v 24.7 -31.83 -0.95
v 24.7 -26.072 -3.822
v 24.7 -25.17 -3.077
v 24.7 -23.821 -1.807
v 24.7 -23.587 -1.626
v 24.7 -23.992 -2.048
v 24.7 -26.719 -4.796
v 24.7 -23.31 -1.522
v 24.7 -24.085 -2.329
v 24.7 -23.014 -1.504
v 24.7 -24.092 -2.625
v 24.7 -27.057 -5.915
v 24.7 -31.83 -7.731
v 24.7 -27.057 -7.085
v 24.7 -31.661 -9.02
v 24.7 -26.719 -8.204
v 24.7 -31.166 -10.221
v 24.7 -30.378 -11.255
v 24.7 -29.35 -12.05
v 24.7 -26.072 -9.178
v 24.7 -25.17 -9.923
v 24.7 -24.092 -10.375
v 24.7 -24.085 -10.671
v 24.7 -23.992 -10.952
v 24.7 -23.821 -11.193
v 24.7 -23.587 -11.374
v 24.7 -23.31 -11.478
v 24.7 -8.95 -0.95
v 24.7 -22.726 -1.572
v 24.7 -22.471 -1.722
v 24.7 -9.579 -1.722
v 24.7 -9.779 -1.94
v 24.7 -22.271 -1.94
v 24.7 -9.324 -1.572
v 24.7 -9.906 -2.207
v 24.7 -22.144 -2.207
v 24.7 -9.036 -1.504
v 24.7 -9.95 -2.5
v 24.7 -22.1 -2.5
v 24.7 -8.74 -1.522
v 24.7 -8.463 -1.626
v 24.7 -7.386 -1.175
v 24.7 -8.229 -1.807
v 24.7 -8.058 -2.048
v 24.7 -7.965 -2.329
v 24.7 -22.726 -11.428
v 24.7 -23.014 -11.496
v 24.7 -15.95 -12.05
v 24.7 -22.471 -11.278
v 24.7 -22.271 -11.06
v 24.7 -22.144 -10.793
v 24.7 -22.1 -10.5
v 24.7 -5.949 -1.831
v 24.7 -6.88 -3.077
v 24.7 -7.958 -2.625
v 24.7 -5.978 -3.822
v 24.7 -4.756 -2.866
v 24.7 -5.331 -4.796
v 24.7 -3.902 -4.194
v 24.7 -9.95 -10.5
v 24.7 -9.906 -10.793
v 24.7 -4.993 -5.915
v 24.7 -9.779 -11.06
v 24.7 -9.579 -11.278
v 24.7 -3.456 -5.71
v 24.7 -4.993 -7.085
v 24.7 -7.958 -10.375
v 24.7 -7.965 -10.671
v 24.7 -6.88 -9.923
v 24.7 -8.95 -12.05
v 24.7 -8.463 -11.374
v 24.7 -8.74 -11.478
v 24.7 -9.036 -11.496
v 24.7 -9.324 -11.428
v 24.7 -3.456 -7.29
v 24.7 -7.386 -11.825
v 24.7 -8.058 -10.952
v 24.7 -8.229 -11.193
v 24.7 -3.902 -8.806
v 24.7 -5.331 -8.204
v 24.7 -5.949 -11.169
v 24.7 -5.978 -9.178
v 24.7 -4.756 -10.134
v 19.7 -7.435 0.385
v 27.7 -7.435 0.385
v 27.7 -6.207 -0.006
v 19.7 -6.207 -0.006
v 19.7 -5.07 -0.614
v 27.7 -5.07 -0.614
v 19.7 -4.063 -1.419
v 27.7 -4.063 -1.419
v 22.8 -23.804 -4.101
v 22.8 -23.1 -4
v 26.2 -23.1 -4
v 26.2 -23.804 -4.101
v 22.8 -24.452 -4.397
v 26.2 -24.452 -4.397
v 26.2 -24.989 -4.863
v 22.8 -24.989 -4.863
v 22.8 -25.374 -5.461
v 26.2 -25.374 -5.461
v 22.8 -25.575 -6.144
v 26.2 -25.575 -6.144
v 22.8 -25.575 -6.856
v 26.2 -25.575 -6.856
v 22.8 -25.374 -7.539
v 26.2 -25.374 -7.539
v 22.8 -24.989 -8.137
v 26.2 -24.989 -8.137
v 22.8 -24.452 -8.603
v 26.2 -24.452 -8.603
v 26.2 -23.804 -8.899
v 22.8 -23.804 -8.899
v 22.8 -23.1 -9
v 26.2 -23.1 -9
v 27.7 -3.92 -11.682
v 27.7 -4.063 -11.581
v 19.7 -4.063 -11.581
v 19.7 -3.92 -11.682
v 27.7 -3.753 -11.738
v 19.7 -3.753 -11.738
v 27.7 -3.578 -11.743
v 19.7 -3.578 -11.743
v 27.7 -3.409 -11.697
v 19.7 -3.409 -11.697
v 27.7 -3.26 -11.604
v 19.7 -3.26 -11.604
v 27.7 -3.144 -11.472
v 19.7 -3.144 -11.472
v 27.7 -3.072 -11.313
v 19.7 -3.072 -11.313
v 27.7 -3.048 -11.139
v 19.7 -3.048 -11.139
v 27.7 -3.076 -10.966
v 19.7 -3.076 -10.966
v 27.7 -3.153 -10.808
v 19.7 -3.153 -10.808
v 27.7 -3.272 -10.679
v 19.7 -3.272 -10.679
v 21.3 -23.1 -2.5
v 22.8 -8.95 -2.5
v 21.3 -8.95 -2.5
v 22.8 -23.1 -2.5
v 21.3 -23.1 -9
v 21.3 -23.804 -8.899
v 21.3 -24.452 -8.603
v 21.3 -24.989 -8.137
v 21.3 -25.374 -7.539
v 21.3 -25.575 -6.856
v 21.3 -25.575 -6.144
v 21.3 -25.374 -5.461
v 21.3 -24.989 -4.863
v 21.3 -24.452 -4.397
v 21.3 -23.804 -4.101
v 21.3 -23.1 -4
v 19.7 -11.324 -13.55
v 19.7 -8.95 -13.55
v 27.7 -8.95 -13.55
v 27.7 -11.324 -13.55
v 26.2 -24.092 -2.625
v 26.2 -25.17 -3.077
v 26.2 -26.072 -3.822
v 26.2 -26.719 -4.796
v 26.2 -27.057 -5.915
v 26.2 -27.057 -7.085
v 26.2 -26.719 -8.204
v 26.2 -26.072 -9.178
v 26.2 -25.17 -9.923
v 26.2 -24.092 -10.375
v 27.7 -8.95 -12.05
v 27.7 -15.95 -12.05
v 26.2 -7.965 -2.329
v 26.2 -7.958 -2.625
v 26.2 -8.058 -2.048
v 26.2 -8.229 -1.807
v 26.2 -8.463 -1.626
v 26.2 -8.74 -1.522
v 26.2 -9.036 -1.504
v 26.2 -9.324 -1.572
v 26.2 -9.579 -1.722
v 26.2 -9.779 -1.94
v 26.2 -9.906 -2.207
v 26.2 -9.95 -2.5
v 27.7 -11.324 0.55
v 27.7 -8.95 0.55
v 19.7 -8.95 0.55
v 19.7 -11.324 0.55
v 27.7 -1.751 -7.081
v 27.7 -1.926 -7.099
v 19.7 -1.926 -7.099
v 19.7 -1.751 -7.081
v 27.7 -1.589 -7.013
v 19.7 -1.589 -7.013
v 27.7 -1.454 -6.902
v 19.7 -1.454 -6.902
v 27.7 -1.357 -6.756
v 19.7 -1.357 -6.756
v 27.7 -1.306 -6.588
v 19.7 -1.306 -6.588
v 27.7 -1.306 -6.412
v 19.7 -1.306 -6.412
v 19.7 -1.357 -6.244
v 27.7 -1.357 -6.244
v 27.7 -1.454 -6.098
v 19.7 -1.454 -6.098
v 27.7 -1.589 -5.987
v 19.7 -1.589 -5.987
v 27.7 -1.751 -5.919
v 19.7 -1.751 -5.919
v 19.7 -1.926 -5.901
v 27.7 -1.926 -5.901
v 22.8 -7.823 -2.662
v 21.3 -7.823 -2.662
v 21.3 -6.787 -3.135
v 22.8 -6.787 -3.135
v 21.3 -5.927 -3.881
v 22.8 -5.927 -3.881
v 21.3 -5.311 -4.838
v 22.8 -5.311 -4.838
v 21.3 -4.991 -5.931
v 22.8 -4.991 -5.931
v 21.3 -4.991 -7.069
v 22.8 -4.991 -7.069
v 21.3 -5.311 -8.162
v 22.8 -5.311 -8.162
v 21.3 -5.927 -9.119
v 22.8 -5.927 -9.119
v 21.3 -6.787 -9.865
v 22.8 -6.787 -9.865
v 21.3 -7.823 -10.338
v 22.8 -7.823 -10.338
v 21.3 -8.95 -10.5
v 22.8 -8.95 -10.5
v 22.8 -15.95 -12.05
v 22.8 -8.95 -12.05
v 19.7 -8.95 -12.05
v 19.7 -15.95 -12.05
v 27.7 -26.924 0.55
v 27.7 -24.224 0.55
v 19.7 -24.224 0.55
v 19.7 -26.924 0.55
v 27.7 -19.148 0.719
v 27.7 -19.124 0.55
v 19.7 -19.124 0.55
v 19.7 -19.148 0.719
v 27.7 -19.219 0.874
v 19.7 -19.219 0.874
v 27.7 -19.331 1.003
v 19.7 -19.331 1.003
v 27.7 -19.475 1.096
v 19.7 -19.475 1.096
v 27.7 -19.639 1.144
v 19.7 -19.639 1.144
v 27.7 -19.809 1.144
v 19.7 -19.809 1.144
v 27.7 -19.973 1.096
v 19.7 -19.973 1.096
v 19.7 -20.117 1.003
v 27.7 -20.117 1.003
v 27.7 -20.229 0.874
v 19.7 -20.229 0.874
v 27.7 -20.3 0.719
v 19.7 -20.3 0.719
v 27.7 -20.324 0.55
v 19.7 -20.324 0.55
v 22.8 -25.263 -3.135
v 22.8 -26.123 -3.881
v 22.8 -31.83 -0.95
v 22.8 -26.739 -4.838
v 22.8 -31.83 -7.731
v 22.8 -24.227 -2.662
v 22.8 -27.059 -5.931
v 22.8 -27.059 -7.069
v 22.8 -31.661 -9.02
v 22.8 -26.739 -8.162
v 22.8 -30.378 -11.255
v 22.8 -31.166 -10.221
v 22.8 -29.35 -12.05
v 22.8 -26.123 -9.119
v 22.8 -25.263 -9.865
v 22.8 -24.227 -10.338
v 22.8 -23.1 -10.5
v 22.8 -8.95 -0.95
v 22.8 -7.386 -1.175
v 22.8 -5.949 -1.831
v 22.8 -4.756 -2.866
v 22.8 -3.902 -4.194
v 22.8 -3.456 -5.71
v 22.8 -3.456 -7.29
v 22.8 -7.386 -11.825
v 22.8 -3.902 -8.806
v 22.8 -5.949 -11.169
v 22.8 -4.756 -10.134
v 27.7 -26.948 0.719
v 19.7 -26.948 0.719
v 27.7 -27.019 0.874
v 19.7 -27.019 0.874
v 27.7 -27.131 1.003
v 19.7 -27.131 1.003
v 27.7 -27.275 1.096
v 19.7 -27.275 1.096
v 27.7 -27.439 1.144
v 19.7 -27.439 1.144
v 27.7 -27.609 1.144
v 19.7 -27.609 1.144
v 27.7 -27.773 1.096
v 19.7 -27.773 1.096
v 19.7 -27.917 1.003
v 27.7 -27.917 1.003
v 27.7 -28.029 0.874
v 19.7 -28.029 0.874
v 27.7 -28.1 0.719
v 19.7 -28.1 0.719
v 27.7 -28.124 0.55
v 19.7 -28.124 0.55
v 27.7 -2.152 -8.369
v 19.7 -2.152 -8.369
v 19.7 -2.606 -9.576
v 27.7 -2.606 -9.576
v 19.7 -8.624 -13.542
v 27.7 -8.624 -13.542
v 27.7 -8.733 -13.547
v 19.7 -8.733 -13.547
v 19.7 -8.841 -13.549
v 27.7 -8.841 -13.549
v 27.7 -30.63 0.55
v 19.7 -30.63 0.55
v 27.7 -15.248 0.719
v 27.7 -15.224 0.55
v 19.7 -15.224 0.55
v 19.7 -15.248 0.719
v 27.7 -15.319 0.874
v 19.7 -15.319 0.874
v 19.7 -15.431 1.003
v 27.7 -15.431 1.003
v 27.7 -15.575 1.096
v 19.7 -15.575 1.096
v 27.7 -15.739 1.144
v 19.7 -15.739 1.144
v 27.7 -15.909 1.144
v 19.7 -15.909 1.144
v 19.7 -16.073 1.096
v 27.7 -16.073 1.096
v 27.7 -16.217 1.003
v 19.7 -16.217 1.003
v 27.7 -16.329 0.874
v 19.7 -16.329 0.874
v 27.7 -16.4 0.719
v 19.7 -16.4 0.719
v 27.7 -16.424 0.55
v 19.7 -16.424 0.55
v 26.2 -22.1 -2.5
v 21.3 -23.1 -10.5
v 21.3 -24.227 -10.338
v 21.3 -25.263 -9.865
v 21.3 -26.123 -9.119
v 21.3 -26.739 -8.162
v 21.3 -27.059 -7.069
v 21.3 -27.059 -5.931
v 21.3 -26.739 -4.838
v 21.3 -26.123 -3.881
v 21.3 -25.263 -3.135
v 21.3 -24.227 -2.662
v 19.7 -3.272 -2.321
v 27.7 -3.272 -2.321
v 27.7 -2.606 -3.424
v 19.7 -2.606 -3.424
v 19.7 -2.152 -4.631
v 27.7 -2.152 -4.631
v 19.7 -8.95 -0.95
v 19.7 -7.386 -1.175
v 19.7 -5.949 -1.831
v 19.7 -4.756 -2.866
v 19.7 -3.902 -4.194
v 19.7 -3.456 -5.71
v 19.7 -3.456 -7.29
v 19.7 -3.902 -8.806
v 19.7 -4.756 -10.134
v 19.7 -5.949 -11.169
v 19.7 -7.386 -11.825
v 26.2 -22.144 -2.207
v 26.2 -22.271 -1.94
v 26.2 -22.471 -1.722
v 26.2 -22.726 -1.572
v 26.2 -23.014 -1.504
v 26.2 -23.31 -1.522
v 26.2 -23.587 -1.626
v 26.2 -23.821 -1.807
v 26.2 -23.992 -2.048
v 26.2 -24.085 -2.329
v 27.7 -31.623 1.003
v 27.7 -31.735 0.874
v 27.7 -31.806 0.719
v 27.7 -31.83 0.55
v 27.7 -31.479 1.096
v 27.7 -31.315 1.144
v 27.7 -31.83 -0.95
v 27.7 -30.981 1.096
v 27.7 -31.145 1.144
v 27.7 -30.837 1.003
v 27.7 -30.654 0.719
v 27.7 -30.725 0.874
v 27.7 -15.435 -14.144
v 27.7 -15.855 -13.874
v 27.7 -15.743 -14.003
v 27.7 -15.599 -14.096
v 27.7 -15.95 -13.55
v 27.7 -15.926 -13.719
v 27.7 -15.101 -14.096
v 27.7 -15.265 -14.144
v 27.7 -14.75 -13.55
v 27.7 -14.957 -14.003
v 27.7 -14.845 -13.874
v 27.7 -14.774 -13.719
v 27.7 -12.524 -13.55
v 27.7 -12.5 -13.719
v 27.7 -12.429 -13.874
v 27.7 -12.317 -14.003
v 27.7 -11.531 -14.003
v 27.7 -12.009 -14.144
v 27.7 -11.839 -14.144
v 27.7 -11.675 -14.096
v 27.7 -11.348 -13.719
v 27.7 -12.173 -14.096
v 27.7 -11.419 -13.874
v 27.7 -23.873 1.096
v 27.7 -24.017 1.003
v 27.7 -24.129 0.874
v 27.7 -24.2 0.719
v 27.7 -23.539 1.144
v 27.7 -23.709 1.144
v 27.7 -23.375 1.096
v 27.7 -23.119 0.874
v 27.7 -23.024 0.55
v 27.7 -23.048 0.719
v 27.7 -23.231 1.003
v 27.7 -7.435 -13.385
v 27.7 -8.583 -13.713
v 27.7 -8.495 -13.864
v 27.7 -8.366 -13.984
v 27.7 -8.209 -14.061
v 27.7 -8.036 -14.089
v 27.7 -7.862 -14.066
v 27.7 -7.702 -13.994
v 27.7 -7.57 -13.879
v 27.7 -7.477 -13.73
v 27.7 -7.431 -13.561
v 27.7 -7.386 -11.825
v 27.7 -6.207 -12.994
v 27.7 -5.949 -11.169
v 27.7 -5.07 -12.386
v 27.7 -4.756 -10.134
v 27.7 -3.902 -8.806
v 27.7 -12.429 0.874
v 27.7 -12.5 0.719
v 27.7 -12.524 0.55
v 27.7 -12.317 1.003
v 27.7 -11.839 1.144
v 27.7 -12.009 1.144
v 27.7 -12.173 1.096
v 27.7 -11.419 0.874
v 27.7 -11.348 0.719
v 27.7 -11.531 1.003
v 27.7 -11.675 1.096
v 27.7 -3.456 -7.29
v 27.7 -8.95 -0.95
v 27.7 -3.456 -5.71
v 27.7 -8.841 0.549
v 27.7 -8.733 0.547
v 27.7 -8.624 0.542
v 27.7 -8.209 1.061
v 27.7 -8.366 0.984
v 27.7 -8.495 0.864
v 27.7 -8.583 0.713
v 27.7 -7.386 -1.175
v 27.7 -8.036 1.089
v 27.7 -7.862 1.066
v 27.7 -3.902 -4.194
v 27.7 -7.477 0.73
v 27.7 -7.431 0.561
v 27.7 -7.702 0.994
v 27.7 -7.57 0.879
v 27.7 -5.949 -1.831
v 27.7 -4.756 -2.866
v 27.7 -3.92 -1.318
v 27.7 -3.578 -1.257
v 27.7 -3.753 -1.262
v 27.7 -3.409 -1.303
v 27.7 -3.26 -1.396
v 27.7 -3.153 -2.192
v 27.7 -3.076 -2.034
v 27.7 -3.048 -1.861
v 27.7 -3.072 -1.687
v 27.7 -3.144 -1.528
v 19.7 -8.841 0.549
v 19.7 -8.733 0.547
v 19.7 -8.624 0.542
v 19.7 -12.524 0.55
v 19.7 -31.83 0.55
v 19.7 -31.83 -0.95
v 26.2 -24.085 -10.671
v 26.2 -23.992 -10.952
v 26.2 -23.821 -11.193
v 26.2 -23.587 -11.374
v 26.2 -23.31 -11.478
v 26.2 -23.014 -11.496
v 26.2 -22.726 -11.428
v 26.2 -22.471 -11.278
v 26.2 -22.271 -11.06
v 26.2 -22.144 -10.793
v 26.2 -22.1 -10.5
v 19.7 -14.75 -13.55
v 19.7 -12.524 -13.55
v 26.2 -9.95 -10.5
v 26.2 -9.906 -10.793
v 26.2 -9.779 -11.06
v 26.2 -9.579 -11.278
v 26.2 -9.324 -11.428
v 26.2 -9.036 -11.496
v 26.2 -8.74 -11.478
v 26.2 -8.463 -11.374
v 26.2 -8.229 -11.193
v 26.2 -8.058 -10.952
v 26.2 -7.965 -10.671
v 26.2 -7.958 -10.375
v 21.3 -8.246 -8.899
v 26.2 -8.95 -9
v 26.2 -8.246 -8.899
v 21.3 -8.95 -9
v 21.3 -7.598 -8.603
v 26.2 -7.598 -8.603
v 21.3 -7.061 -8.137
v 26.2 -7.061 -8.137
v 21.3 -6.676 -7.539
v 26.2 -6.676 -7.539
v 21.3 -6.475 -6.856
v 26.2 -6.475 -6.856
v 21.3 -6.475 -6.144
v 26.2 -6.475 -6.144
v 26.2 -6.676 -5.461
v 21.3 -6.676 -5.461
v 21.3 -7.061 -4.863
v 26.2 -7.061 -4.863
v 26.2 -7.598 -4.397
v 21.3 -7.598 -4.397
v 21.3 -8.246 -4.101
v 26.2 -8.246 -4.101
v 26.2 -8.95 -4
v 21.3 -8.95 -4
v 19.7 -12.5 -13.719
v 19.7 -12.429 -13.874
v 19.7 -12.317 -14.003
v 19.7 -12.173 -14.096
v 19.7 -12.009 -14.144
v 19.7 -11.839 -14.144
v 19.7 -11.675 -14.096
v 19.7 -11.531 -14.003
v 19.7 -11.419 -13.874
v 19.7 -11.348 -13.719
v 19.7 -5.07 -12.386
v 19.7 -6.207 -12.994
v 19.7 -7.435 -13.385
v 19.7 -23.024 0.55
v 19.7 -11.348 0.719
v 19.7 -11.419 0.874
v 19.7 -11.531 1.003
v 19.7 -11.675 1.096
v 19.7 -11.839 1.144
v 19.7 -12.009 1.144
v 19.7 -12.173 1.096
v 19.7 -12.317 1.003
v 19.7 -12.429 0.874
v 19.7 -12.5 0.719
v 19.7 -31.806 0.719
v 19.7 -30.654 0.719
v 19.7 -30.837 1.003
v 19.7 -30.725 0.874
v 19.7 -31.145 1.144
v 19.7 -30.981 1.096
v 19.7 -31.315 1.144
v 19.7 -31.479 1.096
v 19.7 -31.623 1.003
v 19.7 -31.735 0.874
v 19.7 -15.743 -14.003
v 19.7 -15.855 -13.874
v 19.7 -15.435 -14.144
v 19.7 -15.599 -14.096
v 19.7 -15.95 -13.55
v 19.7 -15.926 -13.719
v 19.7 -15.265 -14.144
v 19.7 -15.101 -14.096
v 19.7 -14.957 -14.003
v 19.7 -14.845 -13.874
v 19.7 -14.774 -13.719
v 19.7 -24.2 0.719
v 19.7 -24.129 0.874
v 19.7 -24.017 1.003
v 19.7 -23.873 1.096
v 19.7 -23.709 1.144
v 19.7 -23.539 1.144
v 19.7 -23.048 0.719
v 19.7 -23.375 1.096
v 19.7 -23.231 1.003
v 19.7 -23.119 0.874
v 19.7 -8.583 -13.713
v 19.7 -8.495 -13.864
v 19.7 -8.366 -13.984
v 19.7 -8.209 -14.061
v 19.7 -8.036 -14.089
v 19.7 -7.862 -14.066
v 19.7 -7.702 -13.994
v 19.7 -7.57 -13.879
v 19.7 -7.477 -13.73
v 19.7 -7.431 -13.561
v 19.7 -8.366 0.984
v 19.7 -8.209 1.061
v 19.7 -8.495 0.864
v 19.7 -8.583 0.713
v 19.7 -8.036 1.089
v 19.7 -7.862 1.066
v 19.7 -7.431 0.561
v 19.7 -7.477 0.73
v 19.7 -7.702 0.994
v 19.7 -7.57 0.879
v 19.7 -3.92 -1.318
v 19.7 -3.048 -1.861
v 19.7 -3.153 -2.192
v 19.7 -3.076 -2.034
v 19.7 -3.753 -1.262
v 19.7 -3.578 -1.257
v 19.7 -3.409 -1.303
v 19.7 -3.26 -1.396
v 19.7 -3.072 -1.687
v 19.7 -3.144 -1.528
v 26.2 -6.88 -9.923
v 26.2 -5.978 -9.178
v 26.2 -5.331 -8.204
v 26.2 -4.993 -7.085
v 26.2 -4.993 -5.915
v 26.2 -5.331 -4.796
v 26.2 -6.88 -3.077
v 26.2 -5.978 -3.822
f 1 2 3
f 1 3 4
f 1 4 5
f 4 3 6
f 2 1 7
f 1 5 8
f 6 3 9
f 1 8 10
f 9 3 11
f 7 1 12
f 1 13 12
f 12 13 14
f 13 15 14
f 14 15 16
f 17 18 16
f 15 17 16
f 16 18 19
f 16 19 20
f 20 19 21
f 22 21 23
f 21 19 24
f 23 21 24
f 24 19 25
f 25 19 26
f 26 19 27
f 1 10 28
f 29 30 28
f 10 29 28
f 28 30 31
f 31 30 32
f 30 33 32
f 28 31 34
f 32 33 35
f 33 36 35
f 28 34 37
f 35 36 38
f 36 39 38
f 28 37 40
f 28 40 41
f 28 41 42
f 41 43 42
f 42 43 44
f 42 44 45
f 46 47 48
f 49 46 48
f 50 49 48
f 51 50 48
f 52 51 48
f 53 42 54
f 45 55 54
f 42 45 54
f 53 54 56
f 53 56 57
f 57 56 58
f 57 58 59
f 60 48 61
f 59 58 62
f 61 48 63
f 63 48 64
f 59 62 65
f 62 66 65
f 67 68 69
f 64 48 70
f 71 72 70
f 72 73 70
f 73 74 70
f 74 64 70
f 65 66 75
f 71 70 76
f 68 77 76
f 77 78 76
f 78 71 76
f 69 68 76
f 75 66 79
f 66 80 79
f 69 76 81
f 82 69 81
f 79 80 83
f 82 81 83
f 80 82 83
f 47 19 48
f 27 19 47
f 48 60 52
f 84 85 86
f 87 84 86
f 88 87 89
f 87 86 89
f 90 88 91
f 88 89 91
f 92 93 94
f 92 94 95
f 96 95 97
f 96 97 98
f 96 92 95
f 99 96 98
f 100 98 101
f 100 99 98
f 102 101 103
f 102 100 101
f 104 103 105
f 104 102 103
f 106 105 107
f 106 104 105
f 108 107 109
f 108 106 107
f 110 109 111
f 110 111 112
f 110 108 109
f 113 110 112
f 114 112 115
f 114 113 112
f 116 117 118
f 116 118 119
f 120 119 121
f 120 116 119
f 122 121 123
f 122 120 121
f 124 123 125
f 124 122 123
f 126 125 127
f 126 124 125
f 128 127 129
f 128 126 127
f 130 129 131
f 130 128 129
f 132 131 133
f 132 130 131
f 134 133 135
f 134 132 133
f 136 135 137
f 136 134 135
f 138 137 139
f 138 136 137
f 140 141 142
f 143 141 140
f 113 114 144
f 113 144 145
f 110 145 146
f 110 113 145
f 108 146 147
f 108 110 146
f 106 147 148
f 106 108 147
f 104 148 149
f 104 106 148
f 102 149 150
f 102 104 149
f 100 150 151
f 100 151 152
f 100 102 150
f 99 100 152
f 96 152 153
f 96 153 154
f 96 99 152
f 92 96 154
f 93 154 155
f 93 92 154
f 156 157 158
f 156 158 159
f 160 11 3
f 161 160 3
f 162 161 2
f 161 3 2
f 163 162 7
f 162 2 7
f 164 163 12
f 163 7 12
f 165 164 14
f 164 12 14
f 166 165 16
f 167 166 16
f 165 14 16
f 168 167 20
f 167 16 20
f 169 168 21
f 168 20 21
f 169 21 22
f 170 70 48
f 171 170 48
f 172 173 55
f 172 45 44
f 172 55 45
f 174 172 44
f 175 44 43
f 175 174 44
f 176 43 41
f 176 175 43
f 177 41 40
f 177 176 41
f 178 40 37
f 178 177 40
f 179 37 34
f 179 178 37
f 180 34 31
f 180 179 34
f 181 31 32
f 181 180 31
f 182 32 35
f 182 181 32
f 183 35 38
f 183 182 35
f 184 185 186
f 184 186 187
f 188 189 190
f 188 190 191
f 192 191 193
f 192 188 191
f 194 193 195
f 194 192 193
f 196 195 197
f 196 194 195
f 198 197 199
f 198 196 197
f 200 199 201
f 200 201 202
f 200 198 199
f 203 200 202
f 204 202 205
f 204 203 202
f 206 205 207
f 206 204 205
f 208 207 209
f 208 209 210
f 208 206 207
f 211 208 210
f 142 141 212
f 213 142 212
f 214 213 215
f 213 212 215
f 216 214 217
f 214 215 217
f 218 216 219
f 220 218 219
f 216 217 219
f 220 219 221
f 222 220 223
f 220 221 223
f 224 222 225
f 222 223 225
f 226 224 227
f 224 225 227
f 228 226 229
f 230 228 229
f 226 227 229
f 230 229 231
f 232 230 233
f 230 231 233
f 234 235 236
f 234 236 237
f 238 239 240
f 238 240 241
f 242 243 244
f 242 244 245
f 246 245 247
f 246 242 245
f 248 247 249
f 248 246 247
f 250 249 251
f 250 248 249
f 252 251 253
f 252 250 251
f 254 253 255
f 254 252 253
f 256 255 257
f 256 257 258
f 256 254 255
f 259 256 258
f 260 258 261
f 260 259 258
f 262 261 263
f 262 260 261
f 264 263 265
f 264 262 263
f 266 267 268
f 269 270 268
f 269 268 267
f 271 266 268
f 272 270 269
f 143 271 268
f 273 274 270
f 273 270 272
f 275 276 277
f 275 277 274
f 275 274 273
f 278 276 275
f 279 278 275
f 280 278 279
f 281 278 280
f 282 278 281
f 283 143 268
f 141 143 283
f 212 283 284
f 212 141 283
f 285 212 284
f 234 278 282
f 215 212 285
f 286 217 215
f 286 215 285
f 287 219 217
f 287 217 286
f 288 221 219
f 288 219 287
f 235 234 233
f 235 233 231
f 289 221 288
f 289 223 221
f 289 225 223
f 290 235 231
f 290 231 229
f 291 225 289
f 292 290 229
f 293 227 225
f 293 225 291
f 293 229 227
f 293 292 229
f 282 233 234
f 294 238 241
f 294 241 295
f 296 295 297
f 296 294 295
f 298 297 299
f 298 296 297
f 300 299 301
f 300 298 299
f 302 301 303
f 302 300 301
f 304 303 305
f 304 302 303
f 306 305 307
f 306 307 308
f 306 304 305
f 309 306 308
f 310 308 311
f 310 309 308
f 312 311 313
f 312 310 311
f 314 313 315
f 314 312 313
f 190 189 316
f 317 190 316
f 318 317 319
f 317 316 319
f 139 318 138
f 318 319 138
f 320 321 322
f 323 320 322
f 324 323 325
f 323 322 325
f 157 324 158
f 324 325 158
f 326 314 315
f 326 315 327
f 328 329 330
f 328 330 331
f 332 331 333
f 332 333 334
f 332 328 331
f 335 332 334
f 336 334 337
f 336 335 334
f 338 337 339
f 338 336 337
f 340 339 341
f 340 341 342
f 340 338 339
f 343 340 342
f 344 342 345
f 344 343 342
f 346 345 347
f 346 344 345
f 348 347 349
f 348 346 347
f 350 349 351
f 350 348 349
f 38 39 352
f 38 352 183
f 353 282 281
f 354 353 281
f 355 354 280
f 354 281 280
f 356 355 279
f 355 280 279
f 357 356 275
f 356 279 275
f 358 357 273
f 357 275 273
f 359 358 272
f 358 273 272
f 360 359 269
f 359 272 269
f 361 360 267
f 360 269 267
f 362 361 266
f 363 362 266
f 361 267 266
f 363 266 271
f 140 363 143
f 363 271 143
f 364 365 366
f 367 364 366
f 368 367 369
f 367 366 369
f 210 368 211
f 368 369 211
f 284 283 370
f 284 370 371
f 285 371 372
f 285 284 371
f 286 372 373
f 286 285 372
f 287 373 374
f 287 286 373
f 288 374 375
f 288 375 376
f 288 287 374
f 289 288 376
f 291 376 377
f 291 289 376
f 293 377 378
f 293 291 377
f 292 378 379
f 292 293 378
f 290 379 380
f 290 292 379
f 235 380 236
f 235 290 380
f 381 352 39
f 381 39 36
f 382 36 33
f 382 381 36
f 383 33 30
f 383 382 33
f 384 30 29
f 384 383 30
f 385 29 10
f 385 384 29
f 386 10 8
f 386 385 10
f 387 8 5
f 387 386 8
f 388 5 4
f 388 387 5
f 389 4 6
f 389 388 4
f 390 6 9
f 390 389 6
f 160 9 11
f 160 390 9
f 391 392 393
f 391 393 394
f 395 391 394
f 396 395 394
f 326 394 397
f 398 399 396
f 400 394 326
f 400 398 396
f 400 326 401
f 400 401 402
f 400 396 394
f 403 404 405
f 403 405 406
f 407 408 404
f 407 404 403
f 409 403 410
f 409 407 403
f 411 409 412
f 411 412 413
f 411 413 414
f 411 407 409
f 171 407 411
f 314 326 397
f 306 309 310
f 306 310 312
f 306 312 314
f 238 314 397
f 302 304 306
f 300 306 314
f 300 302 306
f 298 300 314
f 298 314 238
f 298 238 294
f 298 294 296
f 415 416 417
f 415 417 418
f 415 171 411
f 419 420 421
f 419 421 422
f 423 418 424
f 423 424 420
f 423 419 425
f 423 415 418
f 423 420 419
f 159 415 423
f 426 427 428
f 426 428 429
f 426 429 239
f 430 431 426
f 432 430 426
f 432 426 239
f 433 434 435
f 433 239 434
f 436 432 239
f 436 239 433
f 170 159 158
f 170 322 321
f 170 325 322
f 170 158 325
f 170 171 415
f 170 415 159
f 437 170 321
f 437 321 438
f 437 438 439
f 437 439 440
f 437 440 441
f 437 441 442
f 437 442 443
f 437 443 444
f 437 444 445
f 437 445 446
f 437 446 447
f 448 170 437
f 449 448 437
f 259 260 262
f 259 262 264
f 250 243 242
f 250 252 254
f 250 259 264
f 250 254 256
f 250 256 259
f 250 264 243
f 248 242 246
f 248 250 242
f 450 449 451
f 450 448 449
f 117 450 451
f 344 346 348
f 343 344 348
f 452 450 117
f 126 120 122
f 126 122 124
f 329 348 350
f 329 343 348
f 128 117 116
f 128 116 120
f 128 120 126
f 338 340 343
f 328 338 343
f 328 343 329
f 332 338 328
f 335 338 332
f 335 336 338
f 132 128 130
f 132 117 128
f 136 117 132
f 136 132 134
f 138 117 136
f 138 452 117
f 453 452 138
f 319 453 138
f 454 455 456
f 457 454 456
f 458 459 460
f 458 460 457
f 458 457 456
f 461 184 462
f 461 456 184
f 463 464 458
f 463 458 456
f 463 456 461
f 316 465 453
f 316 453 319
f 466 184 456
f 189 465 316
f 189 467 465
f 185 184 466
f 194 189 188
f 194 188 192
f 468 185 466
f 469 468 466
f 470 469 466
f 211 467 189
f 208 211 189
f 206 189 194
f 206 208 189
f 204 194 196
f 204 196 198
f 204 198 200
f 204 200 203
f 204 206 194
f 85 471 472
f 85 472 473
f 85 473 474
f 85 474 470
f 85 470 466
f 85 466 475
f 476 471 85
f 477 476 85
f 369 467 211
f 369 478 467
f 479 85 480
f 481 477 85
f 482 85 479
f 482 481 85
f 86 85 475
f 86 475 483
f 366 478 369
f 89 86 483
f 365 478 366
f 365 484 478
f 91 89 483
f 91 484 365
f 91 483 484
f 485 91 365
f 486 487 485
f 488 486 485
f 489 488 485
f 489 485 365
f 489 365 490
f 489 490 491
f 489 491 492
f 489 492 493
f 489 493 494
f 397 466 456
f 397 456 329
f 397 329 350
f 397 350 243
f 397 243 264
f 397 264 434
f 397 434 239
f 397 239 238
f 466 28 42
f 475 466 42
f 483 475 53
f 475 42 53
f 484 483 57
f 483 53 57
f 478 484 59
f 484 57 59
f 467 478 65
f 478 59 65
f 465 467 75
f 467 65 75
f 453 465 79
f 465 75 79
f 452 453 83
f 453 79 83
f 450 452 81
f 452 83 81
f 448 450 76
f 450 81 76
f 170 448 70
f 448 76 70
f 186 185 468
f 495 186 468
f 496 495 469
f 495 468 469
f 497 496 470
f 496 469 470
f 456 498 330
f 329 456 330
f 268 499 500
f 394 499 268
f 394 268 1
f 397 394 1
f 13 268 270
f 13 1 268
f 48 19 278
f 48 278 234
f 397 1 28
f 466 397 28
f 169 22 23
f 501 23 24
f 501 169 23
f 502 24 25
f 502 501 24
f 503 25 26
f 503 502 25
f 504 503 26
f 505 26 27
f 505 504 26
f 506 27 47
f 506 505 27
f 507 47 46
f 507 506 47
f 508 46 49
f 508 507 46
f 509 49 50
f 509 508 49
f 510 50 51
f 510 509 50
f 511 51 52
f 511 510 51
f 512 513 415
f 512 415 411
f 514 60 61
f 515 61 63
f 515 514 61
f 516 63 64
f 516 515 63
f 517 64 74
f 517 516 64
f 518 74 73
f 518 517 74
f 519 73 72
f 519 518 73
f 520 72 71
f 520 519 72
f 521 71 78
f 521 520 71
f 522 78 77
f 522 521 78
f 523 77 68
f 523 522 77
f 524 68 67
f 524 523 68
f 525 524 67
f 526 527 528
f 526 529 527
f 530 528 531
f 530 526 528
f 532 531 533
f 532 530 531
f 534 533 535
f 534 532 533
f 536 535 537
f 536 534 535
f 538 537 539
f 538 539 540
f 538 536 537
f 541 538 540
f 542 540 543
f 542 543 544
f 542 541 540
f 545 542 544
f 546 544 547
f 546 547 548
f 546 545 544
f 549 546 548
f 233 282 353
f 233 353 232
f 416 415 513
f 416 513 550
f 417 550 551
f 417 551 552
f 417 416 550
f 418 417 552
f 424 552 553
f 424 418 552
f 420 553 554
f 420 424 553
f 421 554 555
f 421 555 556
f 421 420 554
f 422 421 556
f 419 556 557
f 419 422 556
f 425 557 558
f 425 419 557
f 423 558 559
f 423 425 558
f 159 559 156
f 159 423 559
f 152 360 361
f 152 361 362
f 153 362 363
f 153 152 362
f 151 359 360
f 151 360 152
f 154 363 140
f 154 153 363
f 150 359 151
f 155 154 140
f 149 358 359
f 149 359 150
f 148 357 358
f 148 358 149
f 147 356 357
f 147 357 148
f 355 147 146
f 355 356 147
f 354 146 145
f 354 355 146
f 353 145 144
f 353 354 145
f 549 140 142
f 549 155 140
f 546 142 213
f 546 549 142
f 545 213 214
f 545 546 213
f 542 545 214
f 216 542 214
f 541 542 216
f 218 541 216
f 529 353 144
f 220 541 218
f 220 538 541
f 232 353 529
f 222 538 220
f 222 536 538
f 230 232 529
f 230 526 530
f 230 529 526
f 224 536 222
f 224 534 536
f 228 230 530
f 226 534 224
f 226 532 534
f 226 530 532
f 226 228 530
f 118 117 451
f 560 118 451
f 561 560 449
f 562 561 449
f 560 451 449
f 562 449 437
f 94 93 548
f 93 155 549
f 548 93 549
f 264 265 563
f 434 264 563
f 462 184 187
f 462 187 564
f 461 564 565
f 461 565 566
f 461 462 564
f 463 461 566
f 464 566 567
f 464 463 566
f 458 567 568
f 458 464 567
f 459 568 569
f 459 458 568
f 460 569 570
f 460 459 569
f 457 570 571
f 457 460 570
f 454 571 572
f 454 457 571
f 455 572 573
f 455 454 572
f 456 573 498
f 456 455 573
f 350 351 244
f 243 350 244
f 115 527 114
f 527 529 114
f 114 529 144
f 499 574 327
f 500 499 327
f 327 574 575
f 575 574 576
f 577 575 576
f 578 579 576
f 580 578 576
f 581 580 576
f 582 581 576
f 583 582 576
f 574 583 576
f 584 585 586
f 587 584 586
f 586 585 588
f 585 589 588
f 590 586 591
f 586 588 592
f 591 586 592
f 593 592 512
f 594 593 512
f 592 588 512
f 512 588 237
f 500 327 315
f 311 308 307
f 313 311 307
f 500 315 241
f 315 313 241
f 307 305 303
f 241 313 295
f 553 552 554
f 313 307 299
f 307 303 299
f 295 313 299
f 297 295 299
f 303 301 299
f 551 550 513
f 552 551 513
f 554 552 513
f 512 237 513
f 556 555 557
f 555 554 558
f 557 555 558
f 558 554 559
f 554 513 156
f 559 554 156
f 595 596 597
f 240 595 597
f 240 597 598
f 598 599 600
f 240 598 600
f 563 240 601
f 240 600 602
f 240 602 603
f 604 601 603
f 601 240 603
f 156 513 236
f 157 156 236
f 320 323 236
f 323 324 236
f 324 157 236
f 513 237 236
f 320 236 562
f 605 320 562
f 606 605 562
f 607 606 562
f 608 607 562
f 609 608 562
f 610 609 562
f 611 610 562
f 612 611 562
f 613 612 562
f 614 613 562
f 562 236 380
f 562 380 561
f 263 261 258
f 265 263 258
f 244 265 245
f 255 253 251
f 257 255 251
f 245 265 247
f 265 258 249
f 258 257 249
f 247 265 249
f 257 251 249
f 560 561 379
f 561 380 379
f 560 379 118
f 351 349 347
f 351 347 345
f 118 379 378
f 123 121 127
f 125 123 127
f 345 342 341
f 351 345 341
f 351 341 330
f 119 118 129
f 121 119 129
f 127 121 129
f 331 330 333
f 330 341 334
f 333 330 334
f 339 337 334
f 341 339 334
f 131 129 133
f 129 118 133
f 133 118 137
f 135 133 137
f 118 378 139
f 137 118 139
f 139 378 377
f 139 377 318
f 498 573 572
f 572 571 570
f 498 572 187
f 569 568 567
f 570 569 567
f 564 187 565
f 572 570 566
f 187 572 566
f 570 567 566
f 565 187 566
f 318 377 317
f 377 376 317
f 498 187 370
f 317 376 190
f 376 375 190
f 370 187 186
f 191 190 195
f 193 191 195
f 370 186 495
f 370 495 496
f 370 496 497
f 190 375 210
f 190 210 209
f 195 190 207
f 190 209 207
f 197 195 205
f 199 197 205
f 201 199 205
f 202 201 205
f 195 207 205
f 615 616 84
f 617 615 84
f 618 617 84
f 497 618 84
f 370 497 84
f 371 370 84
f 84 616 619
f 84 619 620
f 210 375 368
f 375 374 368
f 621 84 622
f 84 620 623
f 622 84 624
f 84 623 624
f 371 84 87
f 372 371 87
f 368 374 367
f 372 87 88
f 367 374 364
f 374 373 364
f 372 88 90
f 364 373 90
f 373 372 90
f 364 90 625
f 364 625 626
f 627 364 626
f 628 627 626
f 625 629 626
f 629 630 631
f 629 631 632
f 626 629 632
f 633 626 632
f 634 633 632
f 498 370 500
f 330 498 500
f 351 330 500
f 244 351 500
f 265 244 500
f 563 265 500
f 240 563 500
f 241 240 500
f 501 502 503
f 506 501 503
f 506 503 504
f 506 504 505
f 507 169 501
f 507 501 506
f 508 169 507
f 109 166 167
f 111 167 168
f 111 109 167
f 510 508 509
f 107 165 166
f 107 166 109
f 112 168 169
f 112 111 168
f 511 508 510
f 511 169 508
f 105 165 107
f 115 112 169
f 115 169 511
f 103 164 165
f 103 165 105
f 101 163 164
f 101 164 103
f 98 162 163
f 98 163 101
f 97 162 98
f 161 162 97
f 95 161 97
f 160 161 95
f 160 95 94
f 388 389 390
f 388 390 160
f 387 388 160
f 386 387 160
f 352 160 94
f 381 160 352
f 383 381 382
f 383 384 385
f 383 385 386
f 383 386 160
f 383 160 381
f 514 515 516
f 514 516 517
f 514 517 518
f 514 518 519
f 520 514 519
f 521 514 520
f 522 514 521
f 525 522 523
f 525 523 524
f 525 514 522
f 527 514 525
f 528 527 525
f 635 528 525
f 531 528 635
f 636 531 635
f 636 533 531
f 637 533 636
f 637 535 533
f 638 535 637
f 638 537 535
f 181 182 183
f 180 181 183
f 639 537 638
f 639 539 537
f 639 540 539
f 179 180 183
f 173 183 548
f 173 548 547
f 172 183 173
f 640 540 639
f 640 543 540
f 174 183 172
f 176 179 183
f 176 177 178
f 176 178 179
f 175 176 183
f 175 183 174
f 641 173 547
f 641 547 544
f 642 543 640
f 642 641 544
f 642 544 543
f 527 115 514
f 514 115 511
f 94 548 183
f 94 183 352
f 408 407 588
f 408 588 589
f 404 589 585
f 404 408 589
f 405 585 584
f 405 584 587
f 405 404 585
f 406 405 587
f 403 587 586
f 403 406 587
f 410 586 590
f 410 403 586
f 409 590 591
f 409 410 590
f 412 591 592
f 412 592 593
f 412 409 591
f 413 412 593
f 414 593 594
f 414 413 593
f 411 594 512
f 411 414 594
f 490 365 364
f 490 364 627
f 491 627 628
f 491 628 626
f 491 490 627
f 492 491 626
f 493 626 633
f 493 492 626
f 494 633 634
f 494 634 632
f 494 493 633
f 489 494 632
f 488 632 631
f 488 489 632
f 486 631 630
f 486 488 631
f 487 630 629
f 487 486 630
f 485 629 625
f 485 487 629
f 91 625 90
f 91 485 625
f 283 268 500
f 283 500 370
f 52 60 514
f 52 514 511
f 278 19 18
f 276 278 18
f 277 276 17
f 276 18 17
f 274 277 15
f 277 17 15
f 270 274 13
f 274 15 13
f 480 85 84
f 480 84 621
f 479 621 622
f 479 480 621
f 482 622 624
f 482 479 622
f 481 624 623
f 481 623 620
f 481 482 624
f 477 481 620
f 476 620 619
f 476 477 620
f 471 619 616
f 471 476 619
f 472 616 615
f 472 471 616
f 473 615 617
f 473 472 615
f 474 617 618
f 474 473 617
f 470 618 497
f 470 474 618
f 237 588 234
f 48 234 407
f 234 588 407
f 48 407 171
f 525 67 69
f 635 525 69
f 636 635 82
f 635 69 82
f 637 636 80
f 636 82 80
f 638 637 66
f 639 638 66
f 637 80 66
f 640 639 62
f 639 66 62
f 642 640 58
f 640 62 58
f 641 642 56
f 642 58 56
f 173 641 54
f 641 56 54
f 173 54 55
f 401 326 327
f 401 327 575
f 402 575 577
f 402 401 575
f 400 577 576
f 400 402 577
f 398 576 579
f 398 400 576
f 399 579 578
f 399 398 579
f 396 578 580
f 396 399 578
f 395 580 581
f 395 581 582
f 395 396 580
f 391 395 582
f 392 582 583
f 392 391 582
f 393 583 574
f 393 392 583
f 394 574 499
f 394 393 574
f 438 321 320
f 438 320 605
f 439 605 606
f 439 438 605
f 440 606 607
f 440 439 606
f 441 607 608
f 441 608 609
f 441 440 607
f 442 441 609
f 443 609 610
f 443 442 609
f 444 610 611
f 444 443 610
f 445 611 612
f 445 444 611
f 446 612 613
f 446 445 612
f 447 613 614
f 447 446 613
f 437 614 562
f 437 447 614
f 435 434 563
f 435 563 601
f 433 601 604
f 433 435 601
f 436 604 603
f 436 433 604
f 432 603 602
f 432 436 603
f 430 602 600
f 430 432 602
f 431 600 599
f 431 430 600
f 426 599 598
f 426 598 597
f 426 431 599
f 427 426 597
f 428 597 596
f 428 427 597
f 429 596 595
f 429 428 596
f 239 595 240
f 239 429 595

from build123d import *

# Parameters (mm, degrees)
PAD104_DEPTH            = 1.9
POCKET097_DEPTH         = 2
PAD105_DEPTH            = 1.5
PAD106_DEPTH            = 1.5
PAD107_DEPTH            = 4.9
PAD108_DEPTH            = 3.1
PAD110_DEPTH            = 8
SKETCH201_R             = 1
PAD160_DEPTH            = 2
BODY016_ROLL_ANGLE      = -90
BODY016_PLACEMENT_ANGLE = 90


with BuildPart() as part:
    # Sketch196 → Pad104 (new body)
    with BuildSketch(Plane.XY):
        with BuildLine():
            Line((19.17, -5.55), (42.05, -5.55))
            ThreePointArc((42.05, -5.55), (47.6, 0), (42.05, 5.55))
            Line((21.65, 5.55), (42.05, 5.55))
            ThreePointArc((21.65, 5.55), (19.834103, 3.721462), (19.17, 1.231482))
            Line((19.17, -5.55), (19.17, 1.231482))
        make_face()
    extrude(amount=PAD104_DEPTH)

    # Sketch197 (on Face7 of Pad104) → Pocket097 (cut)
    with BuildSketch(Plane.XY.offset(1.9)):
        with BuildLine():
            ThreePointArc((27.9, 2.5), (25.4, 0), (27.9, -2.5))
            Line((27.9, -2.5), (42.05, -2.5))
            ThreePointArc((42.05, -2.5), (44.55, 0), (42.05, 2.5))
            Line((27.9, 2.5), (42.05, 2.5))
        make_face()
    extrude(amount=-POCKET097_DEPTH, mode=Mode.SUBTRACT)

    # Sketch198 (on Face5 of Pocket097) → Pad105 (join)
    with BuildSketch(Plane.XY.offset(1.9)):
        with BuildLine():
            ThreePointArc((42.05, -4), (46.05, 0), (42.05, 4))
            Line((27.9, 4), (42.05, 4))
            ThreePointArc((27.9, 4), (23.899997, 0), (27.9, -4))
            Line((42.05, -4), (27.9, -4))
        make_face()
        with BuildLine():
            ThreePointArc((27.9, 2.5), (25.399983, 0), (27.9, -2.5))
            Line((42.05, -2.5), (27.9, -2.5))
            ThreePointArc((42.05, -2.5), (44.55, 0), (42.05, 2.5))
            Line((42.05, 2.5), (27.9, 2.5))
        make_face(mode=Mode.SUBTRACT)
    extrude(amount=PAD105_DEPTH)

    # Sketch199 (on Face4 of Pad105) → Pad106 (join)
    with BuildSketch(Plane(origin=(0, 0, 0), x_dir=(1, 0, 0), z_dir=(0, 0, -1))):
        with BuildLine():
            Line((27.9, 4), (42.05, 4))
            ThreePointArc((42.05, -4), (46.050003, 0), (42.05, 4))
            Line((42.05, -4), (27.9, -4))
            ThreePointArc((27.9, 4), (23.899975, 0), (27.9, -4))
        make_face()
        with BuildLine():
            ThreePointArc((27.9, 2.5), (25.4, 0), (27.9, -2.5))
            Line((42.05, -2.5), (27.9, -2.5))
            ThreePointArc((42.05, -2.5), (44.55, 0), (42.05, 2.5))
            Line((27.9, 2.5), (42.05, 2.5))
        make_face(mode=Mode.SUBTRACT)
    extrude(amount=PAD106_DEPTH)

    # Sketch200 (on Face5 of Pad106) → Pad107 (join)
    with BuildSketch(Plane.XY.offset(1.9)):
        with BuildLine():
            ThreePointArc((42.05, -5.55), (47.6, 0), (42.05, 5.55))
            Line((42.05, 5.55), (35.05, 5.55))
            Line((35.05, 7.05), (35.05, 5.55))
            Line((42.05, 7.05), (35.05, 7.05))
            ThreePointArc((42.05, -7.05), (49.1, 0), (42.05, 7.05))
            Line((42.05, -7.05), (19.17, -7.05))
            Line((19.17, -7.05), (19.17, -5.55))
            Line((19.17, -5.55), (42.05, -5.55))
        make_face()
    extrude(amount=-PAD107_DEPTH)

    # Sketch200 (on Face5 of Pad106) → Pad108 (join)
    with BuildSketch(Plane.XY.offset(1.9)):
        with BuildLine():
            ThreePointArc((42.05, -5.55), (47.6, 0), (42.05, 5.55))
            Line((42.05, 5.55), (35.05, 5.55))
            Line((35.05, 7.05), (35.05, 5.55))
            Line((42.05, 7.05), (35.05, 7.05))
            ThreePointArc((42.05, -7.05), (49.1, 0), (42.05, 7.05))
            Line((42.05, -7.05), (19.17, -7.05))
            Line((19.17, -7.05), (19.17, -5.55))
            Line((19.17, -5.55), (42.05, -5.55))
        make_face()
    extrude(amount=PAD108_DEPTH)

    # Sketch202 → Pad110 (join)
    with BuildSketch(Plane(origin=(0, 0, -3), x_dir=(1, 0, 0), z_dir=(0, 0, -1))):
        with BuildLine():
            ThreePointArc((24.076013, 7.05), (23.476013, 7.65), (22.876013, 7.05))
            Line((22.876013, 7.05), (24.076013, 7.05))
        make_face()
        with BuildLine():
            ThreePointArc((27.976013, 7.05), (27.376013, 7.65), (26.776013, 7.05))
            Line((26.776013, 7.05), (27.976013, 7.05))
        make_face()
        with BuildLine():
            ThreePointArc((31.876013, 7.05), (31.276013, 7.65), (30.676013, 7.05))
            Line((30.676013, 7.05), (31.876013, 7.05))
        make_face()
        with BuildLine():
            ThreePointArc((35.776013, 7.05), (35.176013, 7.65), (34.576013, 7.05))
            Line((34.576013, 7.05), (35.776013, 7.05))
        make_face()
        with BuildLine():
            ThreePointArc((39.676013, 7.05), (39.076013, 7.65), (38.476013, 7.05))
            Line((38.476013, 7.05), (39.676013, 7.05))
        make_face()
        with BuildLine():
            ThreePointArc((49.074468, -0.599457), (49.7, 0), (49.074468, 0.599457))
            Line((49.074468, 0.599457), (49.074468, -0.599457))
        make_face()
        with BuildLine():
            ThreePointArc((47.727552, 4.179462), (47.802815, 5.042581), (46.937275, 5.081047))
            Line((46.937275, 5.081047), (47.727552, 4.179462))
        make_face()
        with BuildLine():
            ThreePointArc((43.564592, 6.885384), (43.052255, 7.584061), (42.376013, 7.042458))
            Line((42.376013, 7.042458), (43.564592, 6.885384))
        make_face()
        with BuildLine():
            ThreePointArc((46.937275, -5.081047), (47.802815, -5.042581), (47.727552, -4.179462))
            Line((47.727552, -4.179462), (46.937275, -5.081047))
        make_face()
        with BuildLine():
            ThreePointArc((42.376013, -7.042458), (43.052255, -7.584061), (43.564592, -6.885384))
            Line((43.564592, -6.885384), (42.376013, -7.042458))
        make_face()
        with BuildLine():
            ThreePointArc((38.476013, -7.05), (39.076013, -7.65), (39.676013, -7.05))
            Line((39.676013, -7.05), (38.476013, -7.05))
        make_face()
        with BuildLine():
            ThreePointArc((20.37, 7.05), (19.77, 7.65), (19.17, 7.05))
            Line((19.17, 7.05), (20.37, 7.05))
        make_face()
        with BuildLine():
            ThreePointArc((35.05, -7.05), (35.65, -7.65), (36.25, -7.05))
            Line((36.25, -7.05), (35.05, -7.05))
        make_face()
    extrude(amount=-PAD110_DEPTH)

    # Sketch201 (on Face19 of Pad108) → Pad160 (join)
    with BuildSketch(Plane(origin=(0, 0, -1.5), x_dir=(1, 0, 0), z_dir=(0, 0, -1))):
        with Locations((27.9, 4)):
            Circle(SKETCH201_R)
        with Locations((42.05, 4)):
            Circle(SKETCH201_R)
        with Locations((42.05, -4)):
            Circle(SKETCH201_R)
        with Locations((27.9, -4)):
            Circle(SKETCH201_R)
    extrude(amount=-PAD160_DEPTH)


with BuildPart() as part_1:
    # Body016 roll: moved
    add(part.part.rotate(Axis((0, 0, 0), (1, 0, 0)), BODY016_ROLL_ANGLE))


with BuildPart() as part_2:
    # Body016 placement: moved
    add(part_1.part.moved(Location((24.7, -51, -6.5))).rotate(Axis((24.7, -51, -6.5), (0, 0, 1)), BODY016_PLACEMENT_ANGLE))


solid = part_2.part
